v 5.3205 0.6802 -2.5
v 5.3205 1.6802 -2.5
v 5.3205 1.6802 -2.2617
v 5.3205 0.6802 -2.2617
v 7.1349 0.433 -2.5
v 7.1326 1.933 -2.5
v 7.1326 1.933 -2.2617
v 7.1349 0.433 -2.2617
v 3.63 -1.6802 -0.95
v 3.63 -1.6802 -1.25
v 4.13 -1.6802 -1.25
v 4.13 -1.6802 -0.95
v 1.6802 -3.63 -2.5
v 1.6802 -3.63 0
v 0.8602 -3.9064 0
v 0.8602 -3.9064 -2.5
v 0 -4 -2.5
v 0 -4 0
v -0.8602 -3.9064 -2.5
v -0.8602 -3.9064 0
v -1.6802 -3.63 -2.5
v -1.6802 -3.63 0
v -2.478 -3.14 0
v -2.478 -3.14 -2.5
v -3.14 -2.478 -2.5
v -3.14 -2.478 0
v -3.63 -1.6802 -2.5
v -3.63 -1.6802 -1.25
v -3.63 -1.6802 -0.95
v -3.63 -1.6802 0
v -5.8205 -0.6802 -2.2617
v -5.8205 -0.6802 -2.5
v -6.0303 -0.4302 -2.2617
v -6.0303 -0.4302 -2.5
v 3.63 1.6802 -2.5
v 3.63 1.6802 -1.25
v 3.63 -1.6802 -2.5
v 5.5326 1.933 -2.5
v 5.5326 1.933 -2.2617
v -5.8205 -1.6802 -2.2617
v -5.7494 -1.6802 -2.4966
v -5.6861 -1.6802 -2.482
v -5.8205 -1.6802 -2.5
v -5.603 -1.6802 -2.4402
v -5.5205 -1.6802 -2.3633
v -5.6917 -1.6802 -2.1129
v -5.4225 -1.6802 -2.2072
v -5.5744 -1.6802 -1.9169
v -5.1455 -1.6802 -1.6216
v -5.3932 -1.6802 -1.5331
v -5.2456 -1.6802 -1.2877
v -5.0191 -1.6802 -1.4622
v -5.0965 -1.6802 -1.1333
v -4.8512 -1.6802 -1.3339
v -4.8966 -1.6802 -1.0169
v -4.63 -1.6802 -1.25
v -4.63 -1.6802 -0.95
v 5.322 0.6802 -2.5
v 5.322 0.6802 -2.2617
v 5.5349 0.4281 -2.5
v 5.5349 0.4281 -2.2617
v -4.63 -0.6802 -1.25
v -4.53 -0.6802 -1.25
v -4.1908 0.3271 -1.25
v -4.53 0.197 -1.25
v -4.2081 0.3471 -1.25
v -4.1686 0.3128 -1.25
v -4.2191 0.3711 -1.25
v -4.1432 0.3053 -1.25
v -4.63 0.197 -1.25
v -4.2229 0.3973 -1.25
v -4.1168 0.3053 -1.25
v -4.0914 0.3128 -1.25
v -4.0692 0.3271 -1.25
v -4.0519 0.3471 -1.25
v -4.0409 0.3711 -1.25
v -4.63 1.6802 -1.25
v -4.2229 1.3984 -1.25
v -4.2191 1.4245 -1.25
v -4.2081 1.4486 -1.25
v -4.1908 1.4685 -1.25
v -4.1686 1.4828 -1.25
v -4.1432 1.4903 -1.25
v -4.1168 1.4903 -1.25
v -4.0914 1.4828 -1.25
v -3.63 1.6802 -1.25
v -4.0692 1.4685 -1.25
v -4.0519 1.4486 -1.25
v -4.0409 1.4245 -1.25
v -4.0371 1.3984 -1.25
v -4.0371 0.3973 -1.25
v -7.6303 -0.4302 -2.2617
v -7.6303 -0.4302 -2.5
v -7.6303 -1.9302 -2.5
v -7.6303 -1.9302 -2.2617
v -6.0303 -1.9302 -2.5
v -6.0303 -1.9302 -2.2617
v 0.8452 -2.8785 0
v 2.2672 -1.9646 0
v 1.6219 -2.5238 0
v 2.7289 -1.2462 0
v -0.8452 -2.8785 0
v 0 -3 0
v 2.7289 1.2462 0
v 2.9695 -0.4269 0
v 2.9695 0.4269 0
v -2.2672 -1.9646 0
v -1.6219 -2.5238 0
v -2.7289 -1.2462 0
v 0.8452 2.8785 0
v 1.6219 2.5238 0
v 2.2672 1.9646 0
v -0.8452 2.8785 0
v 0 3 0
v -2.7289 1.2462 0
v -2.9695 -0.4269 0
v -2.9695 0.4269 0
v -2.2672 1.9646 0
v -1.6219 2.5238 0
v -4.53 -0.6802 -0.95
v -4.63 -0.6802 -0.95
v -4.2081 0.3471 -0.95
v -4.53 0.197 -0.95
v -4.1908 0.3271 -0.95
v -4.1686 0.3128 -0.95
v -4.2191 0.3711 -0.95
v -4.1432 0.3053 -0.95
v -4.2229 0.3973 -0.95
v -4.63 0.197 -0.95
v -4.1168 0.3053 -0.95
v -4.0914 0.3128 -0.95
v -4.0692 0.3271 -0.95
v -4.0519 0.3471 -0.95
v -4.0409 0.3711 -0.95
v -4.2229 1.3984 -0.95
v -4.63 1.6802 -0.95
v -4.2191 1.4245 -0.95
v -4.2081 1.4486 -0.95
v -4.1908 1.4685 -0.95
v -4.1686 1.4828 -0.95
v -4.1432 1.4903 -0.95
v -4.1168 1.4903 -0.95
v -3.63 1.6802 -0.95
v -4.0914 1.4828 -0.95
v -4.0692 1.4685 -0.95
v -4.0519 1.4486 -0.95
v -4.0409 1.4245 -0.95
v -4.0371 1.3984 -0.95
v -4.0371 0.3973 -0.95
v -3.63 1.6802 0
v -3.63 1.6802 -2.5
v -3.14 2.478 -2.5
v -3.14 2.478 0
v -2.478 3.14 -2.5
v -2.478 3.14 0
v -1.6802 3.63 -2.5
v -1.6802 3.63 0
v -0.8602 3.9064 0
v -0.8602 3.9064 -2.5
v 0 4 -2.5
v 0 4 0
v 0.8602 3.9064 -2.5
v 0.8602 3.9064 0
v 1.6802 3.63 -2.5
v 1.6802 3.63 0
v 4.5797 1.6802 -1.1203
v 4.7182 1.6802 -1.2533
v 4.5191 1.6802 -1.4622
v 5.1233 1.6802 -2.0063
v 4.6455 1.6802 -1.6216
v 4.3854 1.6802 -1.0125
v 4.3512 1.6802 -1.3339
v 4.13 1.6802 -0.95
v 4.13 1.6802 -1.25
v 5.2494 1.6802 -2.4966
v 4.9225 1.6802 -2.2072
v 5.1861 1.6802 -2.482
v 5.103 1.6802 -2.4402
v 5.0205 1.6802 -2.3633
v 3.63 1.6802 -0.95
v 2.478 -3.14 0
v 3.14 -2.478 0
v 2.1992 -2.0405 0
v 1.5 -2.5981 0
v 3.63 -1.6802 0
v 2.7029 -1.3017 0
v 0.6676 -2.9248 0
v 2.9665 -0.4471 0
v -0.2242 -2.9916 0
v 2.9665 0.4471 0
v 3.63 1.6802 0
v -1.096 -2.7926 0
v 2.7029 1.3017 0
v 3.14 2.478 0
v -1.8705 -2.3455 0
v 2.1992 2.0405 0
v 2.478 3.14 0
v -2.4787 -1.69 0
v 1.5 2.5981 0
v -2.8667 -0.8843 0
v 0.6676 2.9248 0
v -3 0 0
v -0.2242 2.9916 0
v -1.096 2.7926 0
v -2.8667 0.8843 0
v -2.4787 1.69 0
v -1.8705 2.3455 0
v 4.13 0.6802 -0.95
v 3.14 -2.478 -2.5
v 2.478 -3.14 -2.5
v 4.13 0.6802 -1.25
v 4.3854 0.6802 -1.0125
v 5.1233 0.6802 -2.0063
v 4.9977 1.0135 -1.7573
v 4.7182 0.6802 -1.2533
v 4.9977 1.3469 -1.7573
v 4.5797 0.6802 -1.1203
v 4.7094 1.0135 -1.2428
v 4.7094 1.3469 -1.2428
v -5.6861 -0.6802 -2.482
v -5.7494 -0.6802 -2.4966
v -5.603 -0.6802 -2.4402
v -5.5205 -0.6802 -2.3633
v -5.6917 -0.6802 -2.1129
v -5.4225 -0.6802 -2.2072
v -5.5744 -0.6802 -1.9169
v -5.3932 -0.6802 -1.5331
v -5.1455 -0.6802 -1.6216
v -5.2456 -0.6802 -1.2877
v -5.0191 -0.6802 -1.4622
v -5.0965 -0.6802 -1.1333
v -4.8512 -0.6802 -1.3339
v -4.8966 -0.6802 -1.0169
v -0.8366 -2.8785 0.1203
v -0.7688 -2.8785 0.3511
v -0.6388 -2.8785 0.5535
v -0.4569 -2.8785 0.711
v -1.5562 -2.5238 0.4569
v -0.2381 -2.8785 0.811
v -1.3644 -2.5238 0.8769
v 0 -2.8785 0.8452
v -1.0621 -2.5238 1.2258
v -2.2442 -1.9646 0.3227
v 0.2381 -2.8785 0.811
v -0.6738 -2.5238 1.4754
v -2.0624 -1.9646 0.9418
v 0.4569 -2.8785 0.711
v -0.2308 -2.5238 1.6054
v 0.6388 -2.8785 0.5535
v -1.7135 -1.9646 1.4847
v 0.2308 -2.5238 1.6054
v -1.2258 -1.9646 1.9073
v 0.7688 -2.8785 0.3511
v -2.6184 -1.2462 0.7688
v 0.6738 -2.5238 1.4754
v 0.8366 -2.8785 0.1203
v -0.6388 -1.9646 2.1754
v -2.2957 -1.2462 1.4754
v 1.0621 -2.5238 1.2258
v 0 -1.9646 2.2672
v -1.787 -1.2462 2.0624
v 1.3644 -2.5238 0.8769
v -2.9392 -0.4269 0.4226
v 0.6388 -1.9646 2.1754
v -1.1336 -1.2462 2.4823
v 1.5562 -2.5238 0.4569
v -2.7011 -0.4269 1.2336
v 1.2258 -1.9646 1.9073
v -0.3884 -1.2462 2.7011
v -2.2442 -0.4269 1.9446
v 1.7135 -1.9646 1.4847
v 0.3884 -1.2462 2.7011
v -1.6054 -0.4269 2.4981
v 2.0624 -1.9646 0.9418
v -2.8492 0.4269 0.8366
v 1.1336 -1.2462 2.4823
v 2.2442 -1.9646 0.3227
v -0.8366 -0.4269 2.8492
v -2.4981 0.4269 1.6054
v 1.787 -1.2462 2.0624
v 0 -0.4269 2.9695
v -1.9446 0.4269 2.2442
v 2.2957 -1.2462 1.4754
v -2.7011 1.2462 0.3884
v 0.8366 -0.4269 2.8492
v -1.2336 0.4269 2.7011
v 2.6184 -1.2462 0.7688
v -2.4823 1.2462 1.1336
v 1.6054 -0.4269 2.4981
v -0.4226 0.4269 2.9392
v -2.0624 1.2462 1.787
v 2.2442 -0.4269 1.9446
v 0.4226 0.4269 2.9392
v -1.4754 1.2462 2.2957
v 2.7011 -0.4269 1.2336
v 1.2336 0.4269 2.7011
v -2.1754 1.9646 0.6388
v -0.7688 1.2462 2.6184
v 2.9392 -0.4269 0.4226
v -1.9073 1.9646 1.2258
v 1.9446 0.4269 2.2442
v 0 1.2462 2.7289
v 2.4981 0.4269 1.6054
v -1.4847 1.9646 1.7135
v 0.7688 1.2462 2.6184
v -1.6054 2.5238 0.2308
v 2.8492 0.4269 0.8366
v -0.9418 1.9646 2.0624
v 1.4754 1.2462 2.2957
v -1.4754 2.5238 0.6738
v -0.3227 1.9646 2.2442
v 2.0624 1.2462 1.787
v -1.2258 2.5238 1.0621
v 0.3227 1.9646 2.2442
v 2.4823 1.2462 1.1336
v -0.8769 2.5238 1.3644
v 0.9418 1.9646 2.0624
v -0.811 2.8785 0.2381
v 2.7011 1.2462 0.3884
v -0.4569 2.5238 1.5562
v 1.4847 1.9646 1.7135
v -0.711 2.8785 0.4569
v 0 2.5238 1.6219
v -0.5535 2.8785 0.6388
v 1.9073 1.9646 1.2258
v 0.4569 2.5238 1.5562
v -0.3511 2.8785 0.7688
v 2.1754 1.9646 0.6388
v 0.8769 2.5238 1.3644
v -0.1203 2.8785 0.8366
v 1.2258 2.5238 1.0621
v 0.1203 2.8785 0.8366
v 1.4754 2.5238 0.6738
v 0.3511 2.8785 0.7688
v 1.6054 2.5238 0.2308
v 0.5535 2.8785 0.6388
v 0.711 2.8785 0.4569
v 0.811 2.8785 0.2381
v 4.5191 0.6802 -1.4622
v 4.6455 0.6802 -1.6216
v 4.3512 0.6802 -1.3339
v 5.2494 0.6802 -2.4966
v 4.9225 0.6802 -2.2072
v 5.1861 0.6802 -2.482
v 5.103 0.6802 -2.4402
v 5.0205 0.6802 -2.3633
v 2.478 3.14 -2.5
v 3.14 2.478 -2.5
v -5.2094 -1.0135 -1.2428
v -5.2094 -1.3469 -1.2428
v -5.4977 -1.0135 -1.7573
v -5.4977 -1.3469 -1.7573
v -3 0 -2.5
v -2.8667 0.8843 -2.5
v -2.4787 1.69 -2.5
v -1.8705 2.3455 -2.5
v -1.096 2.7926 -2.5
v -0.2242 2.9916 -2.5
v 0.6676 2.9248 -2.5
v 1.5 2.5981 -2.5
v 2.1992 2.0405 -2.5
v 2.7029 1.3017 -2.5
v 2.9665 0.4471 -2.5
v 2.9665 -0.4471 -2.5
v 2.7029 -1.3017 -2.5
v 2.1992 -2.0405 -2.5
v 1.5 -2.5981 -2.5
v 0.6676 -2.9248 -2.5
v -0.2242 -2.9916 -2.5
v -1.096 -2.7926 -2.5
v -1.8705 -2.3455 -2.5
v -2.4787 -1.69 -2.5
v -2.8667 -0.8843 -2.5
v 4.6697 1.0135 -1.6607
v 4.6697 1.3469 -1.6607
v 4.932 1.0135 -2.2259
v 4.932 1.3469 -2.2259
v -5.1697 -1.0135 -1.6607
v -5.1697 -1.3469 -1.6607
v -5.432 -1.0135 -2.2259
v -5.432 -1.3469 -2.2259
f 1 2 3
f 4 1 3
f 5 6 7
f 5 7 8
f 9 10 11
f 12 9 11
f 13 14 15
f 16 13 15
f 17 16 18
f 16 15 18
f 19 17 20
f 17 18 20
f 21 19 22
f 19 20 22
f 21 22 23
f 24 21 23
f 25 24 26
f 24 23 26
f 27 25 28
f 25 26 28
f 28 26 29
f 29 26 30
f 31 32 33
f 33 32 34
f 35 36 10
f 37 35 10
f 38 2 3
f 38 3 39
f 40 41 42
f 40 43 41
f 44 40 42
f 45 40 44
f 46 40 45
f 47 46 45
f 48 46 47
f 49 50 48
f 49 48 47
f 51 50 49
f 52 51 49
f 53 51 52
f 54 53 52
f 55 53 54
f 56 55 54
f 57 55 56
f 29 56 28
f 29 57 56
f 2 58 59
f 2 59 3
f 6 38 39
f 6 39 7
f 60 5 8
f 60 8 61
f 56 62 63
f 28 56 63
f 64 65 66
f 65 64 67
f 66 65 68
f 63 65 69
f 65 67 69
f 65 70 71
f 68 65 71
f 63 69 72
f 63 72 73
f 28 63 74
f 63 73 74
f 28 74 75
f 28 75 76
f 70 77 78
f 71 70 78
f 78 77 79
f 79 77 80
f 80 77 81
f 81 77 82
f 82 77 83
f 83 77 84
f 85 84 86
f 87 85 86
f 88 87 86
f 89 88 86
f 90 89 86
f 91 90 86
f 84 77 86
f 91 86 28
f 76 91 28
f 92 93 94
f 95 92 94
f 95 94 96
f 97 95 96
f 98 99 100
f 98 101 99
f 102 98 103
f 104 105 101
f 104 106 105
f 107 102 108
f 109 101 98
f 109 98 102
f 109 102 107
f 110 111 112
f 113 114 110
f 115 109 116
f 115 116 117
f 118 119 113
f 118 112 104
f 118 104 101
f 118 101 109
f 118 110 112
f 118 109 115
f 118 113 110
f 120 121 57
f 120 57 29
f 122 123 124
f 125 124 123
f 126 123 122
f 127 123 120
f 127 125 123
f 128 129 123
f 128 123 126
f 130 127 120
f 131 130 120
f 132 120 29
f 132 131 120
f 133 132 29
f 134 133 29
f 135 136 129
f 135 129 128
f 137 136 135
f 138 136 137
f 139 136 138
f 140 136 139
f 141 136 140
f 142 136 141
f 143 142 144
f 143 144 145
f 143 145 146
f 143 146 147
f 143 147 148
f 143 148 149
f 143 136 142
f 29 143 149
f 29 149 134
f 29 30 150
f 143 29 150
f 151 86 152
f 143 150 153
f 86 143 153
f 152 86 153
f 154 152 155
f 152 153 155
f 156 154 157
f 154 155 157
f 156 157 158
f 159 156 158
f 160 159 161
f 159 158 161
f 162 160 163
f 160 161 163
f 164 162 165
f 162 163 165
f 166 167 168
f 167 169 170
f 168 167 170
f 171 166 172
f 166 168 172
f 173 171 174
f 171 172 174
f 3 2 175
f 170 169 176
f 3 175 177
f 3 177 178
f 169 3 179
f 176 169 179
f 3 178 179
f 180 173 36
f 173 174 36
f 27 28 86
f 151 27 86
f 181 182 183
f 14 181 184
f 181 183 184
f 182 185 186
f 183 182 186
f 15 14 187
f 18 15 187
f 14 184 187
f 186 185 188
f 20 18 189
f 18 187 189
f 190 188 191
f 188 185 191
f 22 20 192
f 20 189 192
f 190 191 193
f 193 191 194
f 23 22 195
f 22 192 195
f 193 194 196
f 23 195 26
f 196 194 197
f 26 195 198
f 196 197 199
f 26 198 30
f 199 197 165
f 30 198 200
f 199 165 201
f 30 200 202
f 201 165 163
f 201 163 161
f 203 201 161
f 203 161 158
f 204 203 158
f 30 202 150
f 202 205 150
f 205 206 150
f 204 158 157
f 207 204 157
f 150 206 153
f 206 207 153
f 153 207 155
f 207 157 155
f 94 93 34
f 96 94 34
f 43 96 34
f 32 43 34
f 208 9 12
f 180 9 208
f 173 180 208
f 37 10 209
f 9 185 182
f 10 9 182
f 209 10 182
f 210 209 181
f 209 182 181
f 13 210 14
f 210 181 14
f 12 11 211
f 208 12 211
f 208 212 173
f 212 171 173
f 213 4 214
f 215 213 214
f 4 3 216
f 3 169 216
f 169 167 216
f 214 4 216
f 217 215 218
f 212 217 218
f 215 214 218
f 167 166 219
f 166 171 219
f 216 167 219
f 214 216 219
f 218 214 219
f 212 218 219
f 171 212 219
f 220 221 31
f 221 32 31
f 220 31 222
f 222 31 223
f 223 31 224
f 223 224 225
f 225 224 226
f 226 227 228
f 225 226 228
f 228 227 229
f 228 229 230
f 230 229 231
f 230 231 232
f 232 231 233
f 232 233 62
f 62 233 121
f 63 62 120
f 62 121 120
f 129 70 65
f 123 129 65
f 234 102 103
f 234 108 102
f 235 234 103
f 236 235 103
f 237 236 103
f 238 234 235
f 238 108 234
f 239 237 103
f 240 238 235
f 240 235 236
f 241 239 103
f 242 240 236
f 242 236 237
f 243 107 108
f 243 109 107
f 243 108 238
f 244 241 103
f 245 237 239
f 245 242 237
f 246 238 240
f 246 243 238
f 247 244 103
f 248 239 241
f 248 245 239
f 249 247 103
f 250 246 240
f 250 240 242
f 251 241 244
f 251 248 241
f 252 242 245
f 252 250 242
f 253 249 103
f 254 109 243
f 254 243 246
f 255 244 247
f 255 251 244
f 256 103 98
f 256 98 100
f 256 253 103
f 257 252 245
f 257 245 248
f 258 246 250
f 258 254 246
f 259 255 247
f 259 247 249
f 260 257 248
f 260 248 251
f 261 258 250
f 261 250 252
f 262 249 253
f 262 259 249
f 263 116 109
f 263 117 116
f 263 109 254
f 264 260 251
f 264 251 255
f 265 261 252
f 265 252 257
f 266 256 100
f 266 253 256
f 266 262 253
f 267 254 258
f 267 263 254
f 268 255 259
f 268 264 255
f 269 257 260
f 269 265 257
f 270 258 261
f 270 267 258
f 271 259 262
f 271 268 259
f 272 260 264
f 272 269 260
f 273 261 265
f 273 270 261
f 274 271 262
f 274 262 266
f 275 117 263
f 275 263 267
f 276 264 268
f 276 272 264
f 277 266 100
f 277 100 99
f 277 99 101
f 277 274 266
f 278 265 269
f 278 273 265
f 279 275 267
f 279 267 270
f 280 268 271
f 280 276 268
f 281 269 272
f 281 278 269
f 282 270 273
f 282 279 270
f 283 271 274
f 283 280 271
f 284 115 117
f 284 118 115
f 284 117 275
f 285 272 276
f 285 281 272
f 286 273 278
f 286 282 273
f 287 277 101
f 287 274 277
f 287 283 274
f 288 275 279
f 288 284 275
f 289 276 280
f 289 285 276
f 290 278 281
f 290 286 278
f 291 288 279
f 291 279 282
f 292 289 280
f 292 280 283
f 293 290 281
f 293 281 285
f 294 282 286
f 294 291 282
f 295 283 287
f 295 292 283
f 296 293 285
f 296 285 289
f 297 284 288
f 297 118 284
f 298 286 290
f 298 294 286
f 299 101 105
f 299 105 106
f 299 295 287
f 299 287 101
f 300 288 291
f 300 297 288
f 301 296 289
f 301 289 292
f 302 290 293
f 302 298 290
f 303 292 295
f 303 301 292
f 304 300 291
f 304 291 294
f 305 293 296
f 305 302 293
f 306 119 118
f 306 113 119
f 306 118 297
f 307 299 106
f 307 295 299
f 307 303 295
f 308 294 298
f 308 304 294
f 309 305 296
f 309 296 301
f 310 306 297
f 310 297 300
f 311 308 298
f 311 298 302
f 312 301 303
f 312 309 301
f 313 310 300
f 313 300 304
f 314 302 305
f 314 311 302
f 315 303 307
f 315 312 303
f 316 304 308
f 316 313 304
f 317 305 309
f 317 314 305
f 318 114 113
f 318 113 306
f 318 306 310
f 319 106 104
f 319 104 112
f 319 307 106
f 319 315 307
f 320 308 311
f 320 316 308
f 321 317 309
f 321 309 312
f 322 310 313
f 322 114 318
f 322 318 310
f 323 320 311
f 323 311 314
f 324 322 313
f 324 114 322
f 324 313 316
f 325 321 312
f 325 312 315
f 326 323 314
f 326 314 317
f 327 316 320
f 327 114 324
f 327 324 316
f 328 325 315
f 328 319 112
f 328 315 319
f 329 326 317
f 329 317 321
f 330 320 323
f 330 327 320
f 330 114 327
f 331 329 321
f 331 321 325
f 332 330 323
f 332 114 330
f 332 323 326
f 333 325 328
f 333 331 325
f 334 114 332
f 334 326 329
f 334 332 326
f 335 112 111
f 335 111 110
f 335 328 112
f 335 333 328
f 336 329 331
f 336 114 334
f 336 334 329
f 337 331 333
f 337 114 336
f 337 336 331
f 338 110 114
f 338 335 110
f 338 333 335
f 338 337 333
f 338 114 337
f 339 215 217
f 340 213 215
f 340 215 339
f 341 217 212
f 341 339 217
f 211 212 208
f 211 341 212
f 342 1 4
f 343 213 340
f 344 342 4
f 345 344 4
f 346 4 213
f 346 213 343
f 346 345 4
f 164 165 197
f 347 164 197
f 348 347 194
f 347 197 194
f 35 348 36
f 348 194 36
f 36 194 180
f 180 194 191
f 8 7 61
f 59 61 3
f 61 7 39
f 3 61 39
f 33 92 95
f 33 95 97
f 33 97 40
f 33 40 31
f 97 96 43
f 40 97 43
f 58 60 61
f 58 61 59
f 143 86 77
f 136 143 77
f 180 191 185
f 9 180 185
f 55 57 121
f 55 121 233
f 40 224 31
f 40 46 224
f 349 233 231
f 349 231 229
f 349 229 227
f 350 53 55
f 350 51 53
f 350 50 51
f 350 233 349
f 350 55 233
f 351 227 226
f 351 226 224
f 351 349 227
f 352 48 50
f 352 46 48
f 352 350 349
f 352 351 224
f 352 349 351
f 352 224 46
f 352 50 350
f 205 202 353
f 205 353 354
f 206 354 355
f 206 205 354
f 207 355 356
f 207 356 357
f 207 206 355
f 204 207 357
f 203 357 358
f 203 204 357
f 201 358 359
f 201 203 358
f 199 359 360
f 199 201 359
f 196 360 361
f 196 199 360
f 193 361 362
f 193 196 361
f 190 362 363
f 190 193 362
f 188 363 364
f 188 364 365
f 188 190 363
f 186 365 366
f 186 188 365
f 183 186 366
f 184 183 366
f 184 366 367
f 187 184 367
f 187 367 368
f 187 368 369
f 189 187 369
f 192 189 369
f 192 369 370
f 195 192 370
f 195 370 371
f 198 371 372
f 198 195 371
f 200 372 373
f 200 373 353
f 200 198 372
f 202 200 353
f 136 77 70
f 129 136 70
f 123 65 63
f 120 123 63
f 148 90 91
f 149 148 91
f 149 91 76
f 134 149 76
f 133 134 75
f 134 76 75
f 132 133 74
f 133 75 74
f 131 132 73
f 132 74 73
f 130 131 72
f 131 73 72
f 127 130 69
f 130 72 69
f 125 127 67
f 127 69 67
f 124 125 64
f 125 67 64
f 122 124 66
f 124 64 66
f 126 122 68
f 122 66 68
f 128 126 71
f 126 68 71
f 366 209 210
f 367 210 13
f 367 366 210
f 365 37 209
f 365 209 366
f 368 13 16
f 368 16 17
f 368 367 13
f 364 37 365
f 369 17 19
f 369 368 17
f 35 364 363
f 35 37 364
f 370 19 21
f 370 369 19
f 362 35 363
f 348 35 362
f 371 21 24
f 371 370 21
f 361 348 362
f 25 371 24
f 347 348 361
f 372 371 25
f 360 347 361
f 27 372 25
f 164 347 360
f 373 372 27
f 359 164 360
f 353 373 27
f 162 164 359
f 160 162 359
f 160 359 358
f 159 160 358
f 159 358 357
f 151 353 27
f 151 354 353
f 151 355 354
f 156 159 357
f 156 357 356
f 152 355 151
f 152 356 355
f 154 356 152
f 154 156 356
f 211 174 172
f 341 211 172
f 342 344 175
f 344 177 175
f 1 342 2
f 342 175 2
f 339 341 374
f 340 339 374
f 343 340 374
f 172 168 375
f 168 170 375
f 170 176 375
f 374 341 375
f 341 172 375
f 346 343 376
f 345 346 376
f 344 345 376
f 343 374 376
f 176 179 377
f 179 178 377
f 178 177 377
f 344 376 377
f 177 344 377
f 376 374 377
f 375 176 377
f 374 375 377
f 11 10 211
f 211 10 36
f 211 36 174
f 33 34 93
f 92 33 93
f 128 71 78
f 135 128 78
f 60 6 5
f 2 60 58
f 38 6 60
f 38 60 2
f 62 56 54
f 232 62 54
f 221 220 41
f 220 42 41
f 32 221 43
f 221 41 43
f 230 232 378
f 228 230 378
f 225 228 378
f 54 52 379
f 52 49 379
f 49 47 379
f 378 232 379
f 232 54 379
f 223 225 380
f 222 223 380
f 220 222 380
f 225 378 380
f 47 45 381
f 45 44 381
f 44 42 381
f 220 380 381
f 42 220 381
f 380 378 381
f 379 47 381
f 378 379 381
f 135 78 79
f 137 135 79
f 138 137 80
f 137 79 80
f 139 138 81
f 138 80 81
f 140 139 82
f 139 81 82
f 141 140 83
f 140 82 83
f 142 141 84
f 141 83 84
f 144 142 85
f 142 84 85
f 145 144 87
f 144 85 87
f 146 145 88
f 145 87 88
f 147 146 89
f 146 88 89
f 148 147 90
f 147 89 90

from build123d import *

# Parameters (mm, degrees)
REVOLVE1_ANGLE      = 180
SKETCH3_R           = 3
BOSS_EXTRUDE1_DEPTH = 2.5
BOSS_EXTRUDE2_DEPTH = 0.3
BOSS_EXTRUDE3_DEPTH = 1
BOSS_EXTRUDE4_DEPTH = 0.238292
SKETCH8_W           = 0.5
SKETCH8_H           = 3.36041664
BOSS_EXTRUDE5_DEPTH = 0.3
BOSS_EXTRUDE6_DEPTH = 1
BOSS_EXTRUDE7_DEPTH = 0.238292


with BuildPart() as part:
    # Sketch2 → Revolve1 (revolve)
    with BuildSketch(Plane.XY):
        with BuildLine():
            Line((0, 3), (0, -3))
            ThreePointArc((0, -3), (-3, 0), (0, 3))
        make_face()
    revolve(axis=Axis((0, 3, 0), (0, 1, 0)), revolution_arc=REVOLVE1_ANGLE)


with BuildPart() as body_2:
    # Sketch3 → Boss-Extrude1 (new body)
    # profile 1 of 3: a face of its own
    with BuildSketch(Plane(origin=(0, 0, 0), x_dir=(-1, 0, 0), z_dir=(0, 0, -1))):
        with BuildLine():
            Line((1.68020832, 3.63), (-1.68020832, 3.63))
            ThreePointArc((-1.68020832, 3.63), (-2.828427125, 2.828427125), (-3.63, 1.68020832))
            Line((-3.63, 1.68020832), (-3.63, -1.68020832))
            ThreePointArc((-3.63, -1.68020832), (-2.828427125, -2.828427125), (-1.68020832, -3.63))
            Line((-1.68020832, -3.63), (1.68020832, -3.63))
            ThreePointArc((1.68020832, -3.63), (2.828427125, -2.828427125), (3.63, -1.68020832))
            Line((3.63, -1.68020832), (3.63, 1.68020832))
            ThreePointArc((3.63, 1.68020832), (2.828427125, 2.828427125), (1.68020832, 3.63))
        make_face()
        Circle(SKETCH3_R, mode=Mode.SUBTRACT)
    # profile 2 of 3: a face of its own
    with BuildSketch(Plane(origin=(0, 0, 0), x_dir=(-1, 0, 0), z_dir=(0, 0, -1))):
        with BuildLine():
            ThreePointArc((1.68020832, 3.63), (0, 4), (-1.68020832, 3.63))
            Line((-1.68020832, 3.63), (1.68020832, 3.63))
        make_face()
    # profile 3 of 3: a face of its own
    with BuildSketch(Plane(origin=(0, 0, 0), x_dir=(-1, 0, 0), z_dir=(0, 0, -1))):
        with BuildLine():
            Line((1.68020832, -3.63), (-1.68020832, -3.63))
            ThreePointArc((-1.68020832, -3.63), (0, -4), (1.68020832, -3.63))
        make_face()
    extrude(amount=BOSS_EXTRUDE1_DEPTH)

    # Sketch4 → Boss-Extrude2 (add)
    with BuildSketch(Plane.XY.offset(-1.25)):
        Polygon((-3.63, -1.68020832), (-3.63, 1.68020832), (-4.63, 1.68020832), (-4.63, 0.197046936), (-4.53, 0.197046936), (-4.53, -0.68020832), (-4.63, -0.68020832), (-4.63, -1.68020832), align=None)
        with BuildLine():
            ThreePointArc((-4.222869936, 1.398358142), (-4.13, 1.491228079), (-4.037130064, 1.398358142))
            Line((-4.037130064, 1.398358142), (-4.037130064, 0.39726547))
            ThreePointArc((-4.037130064, 0.39726547), (-4.13, 0.304395534), (-4.222869936, 0.39726547))
            Line((-4.222869936, 0.39726547), (-4.222869936, 1.398358142))
        make_face(mode=Mode.SUBTRACT)
    extrude(amount=BOSS_EXTRUDE2_DEPTH)

    # Sketch5 → Boss-Extrude3 (add)
    with BuildSketch(Plane.XZ.offset(1.68020832)):
        with BuildLine():
            add(Edge.make_bspline(
                [(-4.63, -0.95), (-5.463341402, -1.05483435), (-5.371978935, -1.839519927), (-5.820491324, -2.261707818)],
                knots=[0, 0, 0, 0, 1, 1, 1, 1], degree=3))
            Line((-5.820491324, -2.261707818), (-5.820491324, -2.5))
            add(Edge.make_bspline(
                [(-4.63, -1.25), (-5.442861914, -1.43504305), (-5.234464185, -2.519833805), (-5.820491324, -2.5)],
                knots=[0, 0, 0, 0, 0.623821485, 0.623821485, 0.623821485, 0.623821485], degree=3))
            Line((-4.63, -1.25), (-4.63, -0.95))
        make_face()
    extrude(amount=-BOSS_EXTRUDE3_DEPTH)

    # Sketch6 → Boss-Extrude4 (add)
    with BuildSketch(Plane(origin=(0, 0, -2.5), x_dir=(-1, 0, 0), z_dir=(0, 0, -1))):
        Polygon((5.820491324, -0.68020832), (6.030266232, -0.43020832), (7.630266232, -0.43020832), (7.630266232, -1.93020832), (6.030266232, -1.93020832), (5.820491324, -1.68020832), align=None)
    extrude(amount=-BOSS_EXTRUDE4_DEPTH)

    # Sketch8 → Boss-Extrude5 (add)
    with BuildSketch(Plane.XY.offset(-1.25)):
        with Locations((3.88, 0)):
            Rectangle(SKETCH8_W, SKETCH8_H)
    extrude(amount=BOSS_EXTRUDE5_DEPTH)

    # Sketch9 → Boss-Extrude6 (add)
    with BuildSketch(Plane(origin=(0, 1.68020832, 0), x_dir=(1, 0, 0), z_dir=(0, 1, 0))):
        with BuildLine():
            add(Edge.make_bspline(
                [(5.320491324, 2.261707818), (4.871978935, 1.839519927), (4.963341402, 1.05483435), (4.13, 0.95)],
                knots=[0, 0, 0, 0, 1, 1, 1, 1], degree=3))
            Line((4.13, 0.95), (4.13, 1.25))
            add(Edge.make_bspline(
                [(4.13, 1.25), (4.942861914, 1.43504305), (4.734464185, 2.519833805), (5.320491324, 2.5)],
                knots=[0, 0, 0, 0, 0.623821485, 0.623821485, 0.623821485, 0.623821485], degree=3))
            Line((5.320491324, 2.5), (5.320491324, 2.261707818))
        make_face()
    extrude(amount=-BOSS_EXTRUDE6_DEPTH)


with BuildPart() as body_3:
    # Sketch10 → Boss-Extrude7 (new body)
    with BuildSketch(Plane(origin=(0, 0, -2.5), x_dir=(-1, 0, 0), z_dir=(0, 0, -1))):
        Polygon((-5.320491324, 1.68020832), (-5.532611235, 1.933002987), (-7.132611235, 1.933002987), (-7.134924542, 0.433006554), (-5.534932153, 0.4280715), (-5.322033529, 0.680210699), align=None)
    extrude(amount=-BOSS_EXTRUDE7_DEPTH)


solid = Compound([part.part, body_2.part, body_3.part])
